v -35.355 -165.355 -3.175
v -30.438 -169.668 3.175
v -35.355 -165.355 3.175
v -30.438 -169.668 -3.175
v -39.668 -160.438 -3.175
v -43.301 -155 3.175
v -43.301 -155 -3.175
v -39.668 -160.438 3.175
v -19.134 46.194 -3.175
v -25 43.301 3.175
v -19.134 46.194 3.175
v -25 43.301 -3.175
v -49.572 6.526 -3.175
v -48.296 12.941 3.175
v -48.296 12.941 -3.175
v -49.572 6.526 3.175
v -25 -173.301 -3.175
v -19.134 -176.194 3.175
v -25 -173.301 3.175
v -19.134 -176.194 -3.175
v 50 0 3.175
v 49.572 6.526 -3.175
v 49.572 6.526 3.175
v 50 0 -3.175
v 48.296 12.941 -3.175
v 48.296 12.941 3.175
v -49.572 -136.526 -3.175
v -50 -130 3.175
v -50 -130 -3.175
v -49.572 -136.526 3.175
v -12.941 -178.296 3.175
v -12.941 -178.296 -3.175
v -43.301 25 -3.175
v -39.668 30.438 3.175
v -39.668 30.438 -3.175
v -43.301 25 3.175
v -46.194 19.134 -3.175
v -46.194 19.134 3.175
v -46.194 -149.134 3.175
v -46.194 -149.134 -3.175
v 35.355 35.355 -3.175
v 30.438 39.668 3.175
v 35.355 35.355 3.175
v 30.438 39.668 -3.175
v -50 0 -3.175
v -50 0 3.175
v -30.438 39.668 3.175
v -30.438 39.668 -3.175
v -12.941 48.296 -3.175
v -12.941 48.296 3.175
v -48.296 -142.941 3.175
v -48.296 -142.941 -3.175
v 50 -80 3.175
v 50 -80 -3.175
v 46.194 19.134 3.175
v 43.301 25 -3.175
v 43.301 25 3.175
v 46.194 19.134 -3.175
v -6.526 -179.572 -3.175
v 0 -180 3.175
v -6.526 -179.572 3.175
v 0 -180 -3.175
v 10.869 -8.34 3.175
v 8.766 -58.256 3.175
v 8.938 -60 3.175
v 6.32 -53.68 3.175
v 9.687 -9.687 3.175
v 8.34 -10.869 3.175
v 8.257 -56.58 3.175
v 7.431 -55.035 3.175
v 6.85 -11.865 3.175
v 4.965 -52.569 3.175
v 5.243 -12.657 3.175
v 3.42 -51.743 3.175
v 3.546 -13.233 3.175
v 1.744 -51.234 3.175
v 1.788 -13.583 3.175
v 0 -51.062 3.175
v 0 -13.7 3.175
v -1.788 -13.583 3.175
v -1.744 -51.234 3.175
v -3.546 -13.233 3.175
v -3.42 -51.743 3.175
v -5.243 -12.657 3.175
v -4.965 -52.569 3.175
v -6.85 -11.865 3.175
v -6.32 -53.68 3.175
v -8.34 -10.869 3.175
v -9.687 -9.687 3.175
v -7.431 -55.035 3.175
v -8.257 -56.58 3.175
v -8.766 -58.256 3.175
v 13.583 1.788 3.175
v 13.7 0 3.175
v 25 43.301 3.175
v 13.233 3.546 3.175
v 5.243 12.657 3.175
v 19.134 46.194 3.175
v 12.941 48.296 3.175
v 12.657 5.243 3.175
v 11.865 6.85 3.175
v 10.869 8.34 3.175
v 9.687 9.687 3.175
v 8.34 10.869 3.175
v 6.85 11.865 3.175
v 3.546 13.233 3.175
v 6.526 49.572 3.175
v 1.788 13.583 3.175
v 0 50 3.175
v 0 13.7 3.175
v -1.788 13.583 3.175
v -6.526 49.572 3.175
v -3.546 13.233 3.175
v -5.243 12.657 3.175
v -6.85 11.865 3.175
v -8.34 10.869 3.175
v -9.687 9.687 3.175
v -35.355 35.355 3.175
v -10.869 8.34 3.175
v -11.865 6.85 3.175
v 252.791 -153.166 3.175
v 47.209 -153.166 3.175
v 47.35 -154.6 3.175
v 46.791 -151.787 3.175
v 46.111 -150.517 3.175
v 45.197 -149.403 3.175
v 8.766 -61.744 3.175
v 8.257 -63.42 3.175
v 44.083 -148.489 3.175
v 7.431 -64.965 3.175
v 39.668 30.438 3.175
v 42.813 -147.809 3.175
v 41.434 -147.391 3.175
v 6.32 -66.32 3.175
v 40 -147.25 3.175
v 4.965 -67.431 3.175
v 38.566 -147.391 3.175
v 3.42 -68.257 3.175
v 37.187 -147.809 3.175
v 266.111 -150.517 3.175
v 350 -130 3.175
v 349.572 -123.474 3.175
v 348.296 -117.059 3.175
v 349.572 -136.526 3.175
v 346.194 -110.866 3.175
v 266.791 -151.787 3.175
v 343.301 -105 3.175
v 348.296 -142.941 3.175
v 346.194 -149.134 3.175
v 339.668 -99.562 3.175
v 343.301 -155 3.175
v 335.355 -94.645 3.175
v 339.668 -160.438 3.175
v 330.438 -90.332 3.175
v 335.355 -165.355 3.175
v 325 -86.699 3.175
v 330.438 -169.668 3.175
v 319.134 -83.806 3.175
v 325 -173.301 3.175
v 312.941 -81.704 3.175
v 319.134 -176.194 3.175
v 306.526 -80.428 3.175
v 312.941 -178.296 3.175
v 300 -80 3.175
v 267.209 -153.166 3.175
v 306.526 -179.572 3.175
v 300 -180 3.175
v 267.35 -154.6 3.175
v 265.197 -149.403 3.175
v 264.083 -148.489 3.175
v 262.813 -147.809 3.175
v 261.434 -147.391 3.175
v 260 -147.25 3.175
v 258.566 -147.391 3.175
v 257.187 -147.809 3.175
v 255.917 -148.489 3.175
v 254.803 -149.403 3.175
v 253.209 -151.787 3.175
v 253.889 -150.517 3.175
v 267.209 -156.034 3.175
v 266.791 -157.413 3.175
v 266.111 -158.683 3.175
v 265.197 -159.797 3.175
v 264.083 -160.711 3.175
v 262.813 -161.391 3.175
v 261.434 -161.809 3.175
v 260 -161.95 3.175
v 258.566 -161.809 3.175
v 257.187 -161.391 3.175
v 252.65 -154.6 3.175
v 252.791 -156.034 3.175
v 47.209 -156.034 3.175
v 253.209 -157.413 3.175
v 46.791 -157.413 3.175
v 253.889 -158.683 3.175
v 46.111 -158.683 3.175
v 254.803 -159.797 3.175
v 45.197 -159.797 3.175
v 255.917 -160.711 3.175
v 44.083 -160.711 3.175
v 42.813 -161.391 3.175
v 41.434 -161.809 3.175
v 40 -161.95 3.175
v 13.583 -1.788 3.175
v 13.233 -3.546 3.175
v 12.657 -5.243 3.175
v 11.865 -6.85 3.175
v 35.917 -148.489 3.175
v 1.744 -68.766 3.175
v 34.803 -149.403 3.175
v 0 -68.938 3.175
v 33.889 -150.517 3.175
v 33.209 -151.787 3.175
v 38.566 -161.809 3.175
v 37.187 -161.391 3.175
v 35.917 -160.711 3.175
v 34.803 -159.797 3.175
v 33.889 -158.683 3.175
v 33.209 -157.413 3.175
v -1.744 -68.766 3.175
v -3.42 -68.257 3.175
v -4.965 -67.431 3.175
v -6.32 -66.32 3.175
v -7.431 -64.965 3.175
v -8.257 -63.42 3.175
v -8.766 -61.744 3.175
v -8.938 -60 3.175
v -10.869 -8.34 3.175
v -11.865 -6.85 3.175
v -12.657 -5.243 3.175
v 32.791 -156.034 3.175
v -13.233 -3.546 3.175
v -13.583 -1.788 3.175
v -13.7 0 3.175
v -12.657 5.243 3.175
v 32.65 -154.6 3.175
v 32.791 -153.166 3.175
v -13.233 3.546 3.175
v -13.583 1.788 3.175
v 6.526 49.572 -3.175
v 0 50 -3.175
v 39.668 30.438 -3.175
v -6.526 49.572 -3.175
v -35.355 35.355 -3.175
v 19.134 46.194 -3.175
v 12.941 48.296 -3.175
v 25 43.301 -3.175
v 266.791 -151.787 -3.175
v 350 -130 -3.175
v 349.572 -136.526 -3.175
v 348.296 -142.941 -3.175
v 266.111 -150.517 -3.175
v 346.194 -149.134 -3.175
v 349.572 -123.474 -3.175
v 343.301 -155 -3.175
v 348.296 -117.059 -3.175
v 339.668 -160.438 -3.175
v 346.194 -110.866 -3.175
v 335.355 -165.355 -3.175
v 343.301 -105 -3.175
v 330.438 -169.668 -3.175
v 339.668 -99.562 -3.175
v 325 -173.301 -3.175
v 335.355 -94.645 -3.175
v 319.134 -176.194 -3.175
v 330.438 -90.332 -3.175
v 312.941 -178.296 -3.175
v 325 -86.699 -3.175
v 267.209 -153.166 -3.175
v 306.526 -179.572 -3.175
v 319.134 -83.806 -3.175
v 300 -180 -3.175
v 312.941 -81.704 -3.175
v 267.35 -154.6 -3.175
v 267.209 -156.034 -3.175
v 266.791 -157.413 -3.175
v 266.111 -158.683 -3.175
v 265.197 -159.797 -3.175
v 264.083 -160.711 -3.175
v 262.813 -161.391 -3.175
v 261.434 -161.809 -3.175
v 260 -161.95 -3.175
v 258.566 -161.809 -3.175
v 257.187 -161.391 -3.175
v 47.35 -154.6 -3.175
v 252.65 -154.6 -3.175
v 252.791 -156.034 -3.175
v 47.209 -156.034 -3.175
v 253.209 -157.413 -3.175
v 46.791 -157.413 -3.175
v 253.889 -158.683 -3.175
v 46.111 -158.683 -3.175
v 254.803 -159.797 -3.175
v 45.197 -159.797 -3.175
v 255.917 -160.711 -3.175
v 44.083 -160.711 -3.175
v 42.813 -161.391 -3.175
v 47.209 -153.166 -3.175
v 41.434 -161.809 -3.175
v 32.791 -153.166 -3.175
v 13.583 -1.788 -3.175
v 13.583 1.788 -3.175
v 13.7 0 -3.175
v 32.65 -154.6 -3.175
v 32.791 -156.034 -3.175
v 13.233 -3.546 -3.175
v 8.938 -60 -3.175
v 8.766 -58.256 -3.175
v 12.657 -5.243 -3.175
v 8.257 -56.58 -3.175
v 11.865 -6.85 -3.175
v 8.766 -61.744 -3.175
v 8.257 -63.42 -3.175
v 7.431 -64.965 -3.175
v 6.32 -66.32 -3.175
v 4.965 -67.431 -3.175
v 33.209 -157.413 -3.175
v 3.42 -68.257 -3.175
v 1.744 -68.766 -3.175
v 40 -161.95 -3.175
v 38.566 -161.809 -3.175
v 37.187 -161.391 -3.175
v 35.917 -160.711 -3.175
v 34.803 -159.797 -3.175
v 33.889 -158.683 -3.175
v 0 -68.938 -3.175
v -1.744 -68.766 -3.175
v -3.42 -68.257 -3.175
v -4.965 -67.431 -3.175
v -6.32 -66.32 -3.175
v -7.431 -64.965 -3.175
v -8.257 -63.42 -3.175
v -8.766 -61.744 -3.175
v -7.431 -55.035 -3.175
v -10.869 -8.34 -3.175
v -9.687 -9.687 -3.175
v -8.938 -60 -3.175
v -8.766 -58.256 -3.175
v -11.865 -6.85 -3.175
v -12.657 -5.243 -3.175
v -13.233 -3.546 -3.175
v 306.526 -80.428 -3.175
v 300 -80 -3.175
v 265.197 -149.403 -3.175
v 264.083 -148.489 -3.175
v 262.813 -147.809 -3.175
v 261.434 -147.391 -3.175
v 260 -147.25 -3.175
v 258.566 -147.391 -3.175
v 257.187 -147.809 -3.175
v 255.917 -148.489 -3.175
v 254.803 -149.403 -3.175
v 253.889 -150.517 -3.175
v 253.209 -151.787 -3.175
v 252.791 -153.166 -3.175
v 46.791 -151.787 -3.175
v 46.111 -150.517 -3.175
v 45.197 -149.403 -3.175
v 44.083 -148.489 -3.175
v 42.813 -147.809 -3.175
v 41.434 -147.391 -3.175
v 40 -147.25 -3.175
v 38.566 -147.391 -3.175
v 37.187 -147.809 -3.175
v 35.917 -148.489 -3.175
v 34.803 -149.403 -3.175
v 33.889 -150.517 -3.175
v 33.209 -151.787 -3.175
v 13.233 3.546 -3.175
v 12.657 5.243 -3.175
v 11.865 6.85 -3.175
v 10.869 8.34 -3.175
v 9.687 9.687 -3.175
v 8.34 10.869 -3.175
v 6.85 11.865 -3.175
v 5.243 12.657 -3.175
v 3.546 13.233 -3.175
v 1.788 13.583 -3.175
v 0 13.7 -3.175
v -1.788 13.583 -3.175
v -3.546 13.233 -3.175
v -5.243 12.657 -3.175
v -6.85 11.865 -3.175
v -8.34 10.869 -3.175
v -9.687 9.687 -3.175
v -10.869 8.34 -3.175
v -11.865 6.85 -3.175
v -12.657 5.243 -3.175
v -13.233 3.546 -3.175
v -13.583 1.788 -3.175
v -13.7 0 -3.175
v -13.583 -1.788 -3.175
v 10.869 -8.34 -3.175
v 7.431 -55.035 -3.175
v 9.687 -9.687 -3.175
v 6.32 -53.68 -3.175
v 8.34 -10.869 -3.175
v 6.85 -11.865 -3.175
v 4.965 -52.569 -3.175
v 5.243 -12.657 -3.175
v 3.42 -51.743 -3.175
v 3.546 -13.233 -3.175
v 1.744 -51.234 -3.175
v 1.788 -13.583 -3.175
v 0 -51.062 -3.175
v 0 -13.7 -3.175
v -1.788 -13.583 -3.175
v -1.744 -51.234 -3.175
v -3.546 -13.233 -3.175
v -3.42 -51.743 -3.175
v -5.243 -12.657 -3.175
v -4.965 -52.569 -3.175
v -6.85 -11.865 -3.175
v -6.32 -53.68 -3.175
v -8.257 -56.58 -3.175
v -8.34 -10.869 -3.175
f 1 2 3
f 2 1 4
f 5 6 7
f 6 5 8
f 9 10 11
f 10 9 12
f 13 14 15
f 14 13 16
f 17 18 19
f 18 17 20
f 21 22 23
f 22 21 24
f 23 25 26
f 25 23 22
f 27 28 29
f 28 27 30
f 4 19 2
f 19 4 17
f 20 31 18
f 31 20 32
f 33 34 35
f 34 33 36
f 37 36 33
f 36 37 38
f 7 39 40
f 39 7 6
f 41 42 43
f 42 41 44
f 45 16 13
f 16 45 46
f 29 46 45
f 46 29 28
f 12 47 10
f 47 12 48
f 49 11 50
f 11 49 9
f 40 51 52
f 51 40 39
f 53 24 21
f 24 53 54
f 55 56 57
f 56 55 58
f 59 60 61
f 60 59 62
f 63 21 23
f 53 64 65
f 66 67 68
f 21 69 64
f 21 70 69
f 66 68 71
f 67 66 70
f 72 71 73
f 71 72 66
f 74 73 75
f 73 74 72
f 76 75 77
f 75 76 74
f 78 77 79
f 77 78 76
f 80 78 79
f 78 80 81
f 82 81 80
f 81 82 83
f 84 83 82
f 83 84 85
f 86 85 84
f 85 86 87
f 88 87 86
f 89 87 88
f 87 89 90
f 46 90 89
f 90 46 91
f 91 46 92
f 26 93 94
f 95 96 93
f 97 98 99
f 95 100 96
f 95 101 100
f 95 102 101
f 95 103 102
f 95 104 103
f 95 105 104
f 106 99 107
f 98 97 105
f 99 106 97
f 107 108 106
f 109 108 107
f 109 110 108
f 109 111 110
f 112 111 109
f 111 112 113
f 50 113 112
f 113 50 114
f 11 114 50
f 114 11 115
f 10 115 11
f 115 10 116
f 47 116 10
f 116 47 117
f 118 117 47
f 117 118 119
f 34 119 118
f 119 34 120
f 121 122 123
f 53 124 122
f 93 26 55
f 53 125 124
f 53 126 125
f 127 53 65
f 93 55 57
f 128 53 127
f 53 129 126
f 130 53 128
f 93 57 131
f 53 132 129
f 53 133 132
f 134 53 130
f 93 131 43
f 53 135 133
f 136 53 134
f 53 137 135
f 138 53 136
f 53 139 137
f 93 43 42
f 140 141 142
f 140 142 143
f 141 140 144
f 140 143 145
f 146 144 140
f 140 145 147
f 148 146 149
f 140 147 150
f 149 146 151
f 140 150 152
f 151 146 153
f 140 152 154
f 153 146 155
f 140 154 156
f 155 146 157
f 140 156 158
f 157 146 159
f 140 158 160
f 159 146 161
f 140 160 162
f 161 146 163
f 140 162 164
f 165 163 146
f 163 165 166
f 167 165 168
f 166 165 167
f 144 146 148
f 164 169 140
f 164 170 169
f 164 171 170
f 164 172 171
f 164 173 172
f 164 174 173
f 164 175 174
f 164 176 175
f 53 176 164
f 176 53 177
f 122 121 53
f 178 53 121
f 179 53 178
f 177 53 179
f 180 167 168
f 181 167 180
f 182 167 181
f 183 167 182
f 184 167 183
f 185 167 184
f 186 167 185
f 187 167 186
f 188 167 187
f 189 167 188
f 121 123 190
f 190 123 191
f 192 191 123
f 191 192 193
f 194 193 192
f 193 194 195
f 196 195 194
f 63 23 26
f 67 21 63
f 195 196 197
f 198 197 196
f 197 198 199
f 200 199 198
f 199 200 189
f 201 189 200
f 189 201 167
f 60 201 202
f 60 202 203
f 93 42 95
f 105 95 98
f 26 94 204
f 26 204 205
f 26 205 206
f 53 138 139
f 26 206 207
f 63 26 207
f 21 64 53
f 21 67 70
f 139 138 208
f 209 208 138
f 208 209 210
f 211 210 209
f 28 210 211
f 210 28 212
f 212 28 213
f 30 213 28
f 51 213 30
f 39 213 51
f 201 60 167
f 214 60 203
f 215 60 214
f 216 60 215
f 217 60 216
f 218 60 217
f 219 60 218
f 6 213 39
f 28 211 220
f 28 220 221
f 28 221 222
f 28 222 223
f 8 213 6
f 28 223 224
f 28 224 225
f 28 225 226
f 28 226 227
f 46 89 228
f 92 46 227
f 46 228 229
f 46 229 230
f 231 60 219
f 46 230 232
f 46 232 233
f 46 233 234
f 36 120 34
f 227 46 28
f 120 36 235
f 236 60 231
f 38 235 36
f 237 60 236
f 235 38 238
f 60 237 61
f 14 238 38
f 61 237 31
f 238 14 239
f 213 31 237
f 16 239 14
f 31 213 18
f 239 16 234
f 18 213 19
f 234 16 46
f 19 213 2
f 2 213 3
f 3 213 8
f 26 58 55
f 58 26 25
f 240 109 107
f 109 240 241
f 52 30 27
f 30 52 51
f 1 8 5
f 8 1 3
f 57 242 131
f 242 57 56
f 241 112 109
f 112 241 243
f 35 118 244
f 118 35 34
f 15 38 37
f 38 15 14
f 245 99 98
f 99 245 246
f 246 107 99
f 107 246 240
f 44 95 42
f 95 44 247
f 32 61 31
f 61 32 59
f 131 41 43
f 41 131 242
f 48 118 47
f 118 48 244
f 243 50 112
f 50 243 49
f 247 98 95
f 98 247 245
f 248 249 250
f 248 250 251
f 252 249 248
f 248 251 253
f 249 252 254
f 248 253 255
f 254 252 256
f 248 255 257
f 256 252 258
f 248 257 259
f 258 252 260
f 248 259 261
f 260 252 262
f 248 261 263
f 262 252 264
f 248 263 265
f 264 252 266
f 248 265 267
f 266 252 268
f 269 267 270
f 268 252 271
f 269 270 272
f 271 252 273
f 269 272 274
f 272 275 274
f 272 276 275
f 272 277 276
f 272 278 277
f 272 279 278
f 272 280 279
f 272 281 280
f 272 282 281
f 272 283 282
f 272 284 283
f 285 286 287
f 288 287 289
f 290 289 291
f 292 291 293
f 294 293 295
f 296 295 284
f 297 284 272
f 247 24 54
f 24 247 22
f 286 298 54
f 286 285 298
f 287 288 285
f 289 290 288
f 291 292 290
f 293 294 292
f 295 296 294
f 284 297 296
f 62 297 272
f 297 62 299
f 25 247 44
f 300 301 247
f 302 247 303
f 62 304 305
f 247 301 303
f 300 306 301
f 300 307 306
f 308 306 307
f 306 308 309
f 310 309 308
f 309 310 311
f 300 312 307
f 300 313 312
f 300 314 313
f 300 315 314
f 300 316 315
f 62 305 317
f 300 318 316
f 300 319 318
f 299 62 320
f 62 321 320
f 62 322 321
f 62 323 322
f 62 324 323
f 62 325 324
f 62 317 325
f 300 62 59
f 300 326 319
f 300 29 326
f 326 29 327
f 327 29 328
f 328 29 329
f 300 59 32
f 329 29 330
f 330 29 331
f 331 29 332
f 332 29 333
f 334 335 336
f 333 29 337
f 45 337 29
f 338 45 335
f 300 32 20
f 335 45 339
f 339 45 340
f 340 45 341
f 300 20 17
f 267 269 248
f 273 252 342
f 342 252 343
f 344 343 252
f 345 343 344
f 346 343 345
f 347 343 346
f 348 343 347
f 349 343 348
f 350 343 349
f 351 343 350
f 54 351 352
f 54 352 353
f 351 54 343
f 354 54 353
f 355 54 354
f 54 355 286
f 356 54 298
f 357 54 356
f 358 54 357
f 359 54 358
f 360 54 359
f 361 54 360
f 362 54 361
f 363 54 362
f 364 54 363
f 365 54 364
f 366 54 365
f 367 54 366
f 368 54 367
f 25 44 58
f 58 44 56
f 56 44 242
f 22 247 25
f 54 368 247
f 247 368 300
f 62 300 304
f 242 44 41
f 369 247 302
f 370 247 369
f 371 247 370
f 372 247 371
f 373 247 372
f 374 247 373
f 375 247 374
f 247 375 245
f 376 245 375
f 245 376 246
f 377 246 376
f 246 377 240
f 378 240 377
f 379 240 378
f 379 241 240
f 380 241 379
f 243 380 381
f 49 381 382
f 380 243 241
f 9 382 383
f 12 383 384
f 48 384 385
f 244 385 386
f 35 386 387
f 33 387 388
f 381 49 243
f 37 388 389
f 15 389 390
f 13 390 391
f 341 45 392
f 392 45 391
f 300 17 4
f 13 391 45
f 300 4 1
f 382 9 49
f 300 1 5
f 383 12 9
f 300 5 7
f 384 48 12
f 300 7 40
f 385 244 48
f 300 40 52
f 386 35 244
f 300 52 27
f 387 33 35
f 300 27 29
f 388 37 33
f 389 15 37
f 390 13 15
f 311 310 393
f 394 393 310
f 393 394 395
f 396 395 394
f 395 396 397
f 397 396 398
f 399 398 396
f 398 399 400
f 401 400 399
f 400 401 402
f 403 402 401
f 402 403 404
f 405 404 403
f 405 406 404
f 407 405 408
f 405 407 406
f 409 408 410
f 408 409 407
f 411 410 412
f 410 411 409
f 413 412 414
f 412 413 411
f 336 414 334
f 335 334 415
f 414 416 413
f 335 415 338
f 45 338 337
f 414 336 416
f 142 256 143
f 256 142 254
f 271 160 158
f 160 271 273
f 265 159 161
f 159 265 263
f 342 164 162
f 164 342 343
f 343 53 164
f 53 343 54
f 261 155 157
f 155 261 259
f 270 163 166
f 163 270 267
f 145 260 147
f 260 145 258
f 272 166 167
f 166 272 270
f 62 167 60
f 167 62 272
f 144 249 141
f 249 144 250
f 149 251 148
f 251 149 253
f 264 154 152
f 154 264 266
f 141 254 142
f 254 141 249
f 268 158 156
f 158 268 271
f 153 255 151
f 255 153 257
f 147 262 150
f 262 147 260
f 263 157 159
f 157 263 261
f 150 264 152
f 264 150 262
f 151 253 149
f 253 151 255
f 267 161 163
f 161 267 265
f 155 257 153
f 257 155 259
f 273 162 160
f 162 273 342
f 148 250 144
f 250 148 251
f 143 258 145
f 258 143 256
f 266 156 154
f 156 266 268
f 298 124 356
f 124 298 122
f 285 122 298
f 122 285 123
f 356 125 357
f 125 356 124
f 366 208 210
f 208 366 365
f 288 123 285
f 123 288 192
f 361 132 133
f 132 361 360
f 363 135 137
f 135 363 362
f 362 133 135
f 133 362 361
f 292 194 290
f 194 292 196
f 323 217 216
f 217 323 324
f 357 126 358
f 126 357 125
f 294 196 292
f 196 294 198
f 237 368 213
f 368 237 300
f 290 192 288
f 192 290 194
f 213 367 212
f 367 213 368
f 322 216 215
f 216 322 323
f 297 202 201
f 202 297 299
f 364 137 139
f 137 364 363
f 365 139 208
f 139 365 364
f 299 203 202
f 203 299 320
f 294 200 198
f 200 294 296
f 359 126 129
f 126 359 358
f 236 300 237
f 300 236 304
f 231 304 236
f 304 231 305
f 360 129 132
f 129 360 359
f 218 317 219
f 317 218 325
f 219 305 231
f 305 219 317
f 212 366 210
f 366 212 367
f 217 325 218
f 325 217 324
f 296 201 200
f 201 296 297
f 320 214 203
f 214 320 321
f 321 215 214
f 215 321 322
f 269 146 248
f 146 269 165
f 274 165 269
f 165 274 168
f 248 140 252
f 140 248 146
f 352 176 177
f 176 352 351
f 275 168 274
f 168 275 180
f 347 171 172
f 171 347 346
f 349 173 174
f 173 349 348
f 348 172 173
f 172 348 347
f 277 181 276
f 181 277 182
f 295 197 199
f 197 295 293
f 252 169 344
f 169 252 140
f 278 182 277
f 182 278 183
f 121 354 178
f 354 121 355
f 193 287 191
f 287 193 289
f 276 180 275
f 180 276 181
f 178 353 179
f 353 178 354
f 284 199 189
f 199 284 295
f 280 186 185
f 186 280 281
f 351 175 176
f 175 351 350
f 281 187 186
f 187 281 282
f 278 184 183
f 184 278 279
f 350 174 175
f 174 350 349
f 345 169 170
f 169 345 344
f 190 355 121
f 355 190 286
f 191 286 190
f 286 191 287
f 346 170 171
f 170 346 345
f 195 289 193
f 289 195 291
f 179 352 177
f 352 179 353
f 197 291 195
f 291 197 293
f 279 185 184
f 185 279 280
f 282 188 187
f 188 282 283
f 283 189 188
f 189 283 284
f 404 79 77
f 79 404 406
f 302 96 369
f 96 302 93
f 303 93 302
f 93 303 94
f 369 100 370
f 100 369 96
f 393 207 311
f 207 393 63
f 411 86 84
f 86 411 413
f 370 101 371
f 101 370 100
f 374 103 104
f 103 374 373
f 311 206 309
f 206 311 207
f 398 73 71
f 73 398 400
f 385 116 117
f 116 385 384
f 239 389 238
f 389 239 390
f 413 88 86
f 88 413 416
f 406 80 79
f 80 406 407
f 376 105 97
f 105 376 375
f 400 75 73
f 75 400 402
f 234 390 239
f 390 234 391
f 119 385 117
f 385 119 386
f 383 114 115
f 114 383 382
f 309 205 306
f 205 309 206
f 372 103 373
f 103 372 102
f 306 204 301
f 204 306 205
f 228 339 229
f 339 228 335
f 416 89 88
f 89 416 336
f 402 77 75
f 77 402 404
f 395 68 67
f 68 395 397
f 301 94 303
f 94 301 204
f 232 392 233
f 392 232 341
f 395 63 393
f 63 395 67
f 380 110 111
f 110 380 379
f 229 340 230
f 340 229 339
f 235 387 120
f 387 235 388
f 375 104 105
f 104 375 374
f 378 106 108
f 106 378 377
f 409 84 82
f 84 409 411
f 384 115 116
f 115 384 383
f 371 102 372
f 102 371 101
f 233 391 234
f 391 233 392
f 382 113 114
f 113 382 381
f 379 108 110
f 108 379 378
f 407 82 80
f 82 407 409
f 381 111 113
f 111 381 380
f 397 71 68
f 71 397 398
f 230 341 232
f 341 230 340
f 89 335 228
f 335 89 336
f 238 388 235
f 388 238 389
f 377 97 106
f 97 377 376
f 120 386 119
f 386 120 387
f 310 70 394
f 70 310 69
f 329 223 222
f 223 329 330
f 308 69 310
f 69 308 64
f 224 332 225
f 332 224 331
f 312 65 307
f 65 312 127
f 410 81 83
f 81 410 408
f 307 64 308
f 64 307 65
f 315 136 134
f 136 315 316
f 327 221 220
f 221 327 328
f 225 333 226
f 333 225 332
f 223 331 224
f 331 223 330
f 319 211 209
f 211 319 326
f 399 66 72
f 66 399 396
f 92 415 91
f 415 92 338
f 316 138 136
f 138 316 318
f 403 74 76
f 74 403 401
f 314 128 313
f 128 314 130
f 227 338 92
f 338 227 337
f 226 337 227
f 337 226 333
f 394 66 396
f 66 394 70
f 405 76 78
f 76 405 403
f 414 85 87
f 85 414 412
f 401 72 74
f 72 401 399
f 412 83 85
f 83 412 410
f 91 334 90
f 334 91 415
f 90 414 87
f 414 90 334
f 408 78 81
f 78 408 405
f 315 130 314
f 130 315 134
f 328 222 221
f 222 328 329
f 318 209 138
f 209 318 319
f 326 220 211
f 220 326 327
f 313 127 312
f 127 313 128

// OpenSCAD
// platform_pivot_bracket.scad
// Pivot bracket plate for LifeTrac v25 folding platform
// CNC cut from 1/4" plate
// Part of the 5-component folding platform system
//
// This bracket connects the angle iron arm to the machine frame:
//   - One end has bolt holes for angle iron attachment
//   - Other end has a 1" pivot hole and lock pin hole
//
// Two brackets required (left and right side)

include <../lifetrac_v25_params.scad>

/**
 * Creates the pivot bracket plate with pivot hole, lock hole, and bolt holes
 * All dimensions are parametric from lifetrac_v25_params.scad
 * 
 * Coordinate system when rendered:
 *   - Centered at origin in X and Y
 *   - Thickness in Z direction
 *   - Lock hole at Origin [0,0]
 *   - Pivot hole at [0, PLATFORM_LOCK_OFFSET]
 *   - Bolt holes at +X
 *   - Designed to be oriented vertically when installed
 */
module platform_pivot_bracket() {
    // Local variables
    thickness = PLATFORM_THICKNESS;
    width = PLATFORM_BRACKET_WIDTH;
    
    // Dimensions relative to Pivot Hole at (0,0)
    pivot_y = 0;
    lock_y = -PLATFORM_LOCK_OFFSET; // -60mm
    corner_y = lock_y + PLATFORM_SIDE_BOLT_Y_OFFSET; // -130mm
    
    // Corner radius - using width/2 to maintain constant width and avoid pinching
    corner_radius = width / 2; 
    
    // Bolt positions
    // Moved to Leg 2 (Horizontal in File X, Vertical in Assembly Z)
    // This places bolts on the "bottom" leg relative to the L-shape in 2D view
    
    // Y position is constant (centered on Leg 2)
    // Leg 2 is centered at corner_y. Width is width.
    // We want bolts in the "bottom half" of the leg width.
    // Bottom edge is corner_y - width/2.
    // Bolt Y = Bottom Edge + LEG/2.
    bolt_y = corner_y - width/2 + PLATFORM_ANGLE_LEG/2;
    
    // X positions (distributed along Leg 2)
    // Leg 2 extends from X=0 to X=PLATFORM_BRACKET_LENGTH - width/2
    // We place bolts at pivot_bolt_offset from each end of this span
    leg2_length = PLATFORM_BRACKET_LENGTH - width/2;
    bolt_x_1 = pivot_bolt_offset;
    bolt_x_2 = leg2_length - pivot_bolt_offset;
    
    // Hole diameters
    pivot_hole_dia = PLATFORM_PIVOT_PIN_DIA + PLATFORM_BOLT_CLEARANCE;
    bolt_hole_dia = PLATFORM_BOLT_DIA + PLATFORM_BOLT_CLEARANCE;
    lock_hole_dia = PLATFORM_LOCK_PIN_DIA + PLATFORM_BOLT_CLEARANCE;
    
    difference() {
        union() {
            // Vertical Leg (Pivot to Corner) - Along Y
            hull() {
                // Pivot position
                translate([0, pivot_y, 0])
                cylinder(d=width, h=thickness, center=true, $fn=48);
                
                // Corner position
                translate([0, corner_y, 0])
                cylinder(r=corner_radius, h=thickness, center=true, $fn=48);
            }
            
            // Horizontal Leg (Corner to End) - Along X
            hull() {
                // Corner position
                translate([0, corner_y, 0])
                cylinder(r=corner_radius, h=thickness, center=true, $fn=48);
                
                // Extended to reach back of platform deck (PLATFORM_BRACKET_LENGTH)
                translate([PLATFORM_BRACKET_LENGTH - width/2, corner_y, 0]) 
                cylinder(d=width, h=thickness, center=true, $fn=48);
            }
        }
        
        // Pivot hole at [0, 0]
        translate([0, pivot_y, 0])
        cylinder(d=pivot_hole_dia, h=thickness + 4, center=true, $fn=48);
        
        // Lock pin hole at [0, -60]
        translate([0, lock_y, 0])
        cylinder(d=lock_hole_dia, h=thickness + 4, center=true, $fn=32);
        
        // Bolt holes
        // Positioned along Leg 2 (X axis)
        for (bx = [bolt_x_1, bolt_x_2]) {
            translate([bx, bolt_y, 0])
            cylinder(d=bolt_hole_dia, h=thickness + 4, center=true, $fn=32);
        }
    }
}

// Render the part for preview/export
if ($preview || len(search("platform_pivot_bracket.scad", parent_modules())) == 0) {
    platform_pivot_bracket();
}
